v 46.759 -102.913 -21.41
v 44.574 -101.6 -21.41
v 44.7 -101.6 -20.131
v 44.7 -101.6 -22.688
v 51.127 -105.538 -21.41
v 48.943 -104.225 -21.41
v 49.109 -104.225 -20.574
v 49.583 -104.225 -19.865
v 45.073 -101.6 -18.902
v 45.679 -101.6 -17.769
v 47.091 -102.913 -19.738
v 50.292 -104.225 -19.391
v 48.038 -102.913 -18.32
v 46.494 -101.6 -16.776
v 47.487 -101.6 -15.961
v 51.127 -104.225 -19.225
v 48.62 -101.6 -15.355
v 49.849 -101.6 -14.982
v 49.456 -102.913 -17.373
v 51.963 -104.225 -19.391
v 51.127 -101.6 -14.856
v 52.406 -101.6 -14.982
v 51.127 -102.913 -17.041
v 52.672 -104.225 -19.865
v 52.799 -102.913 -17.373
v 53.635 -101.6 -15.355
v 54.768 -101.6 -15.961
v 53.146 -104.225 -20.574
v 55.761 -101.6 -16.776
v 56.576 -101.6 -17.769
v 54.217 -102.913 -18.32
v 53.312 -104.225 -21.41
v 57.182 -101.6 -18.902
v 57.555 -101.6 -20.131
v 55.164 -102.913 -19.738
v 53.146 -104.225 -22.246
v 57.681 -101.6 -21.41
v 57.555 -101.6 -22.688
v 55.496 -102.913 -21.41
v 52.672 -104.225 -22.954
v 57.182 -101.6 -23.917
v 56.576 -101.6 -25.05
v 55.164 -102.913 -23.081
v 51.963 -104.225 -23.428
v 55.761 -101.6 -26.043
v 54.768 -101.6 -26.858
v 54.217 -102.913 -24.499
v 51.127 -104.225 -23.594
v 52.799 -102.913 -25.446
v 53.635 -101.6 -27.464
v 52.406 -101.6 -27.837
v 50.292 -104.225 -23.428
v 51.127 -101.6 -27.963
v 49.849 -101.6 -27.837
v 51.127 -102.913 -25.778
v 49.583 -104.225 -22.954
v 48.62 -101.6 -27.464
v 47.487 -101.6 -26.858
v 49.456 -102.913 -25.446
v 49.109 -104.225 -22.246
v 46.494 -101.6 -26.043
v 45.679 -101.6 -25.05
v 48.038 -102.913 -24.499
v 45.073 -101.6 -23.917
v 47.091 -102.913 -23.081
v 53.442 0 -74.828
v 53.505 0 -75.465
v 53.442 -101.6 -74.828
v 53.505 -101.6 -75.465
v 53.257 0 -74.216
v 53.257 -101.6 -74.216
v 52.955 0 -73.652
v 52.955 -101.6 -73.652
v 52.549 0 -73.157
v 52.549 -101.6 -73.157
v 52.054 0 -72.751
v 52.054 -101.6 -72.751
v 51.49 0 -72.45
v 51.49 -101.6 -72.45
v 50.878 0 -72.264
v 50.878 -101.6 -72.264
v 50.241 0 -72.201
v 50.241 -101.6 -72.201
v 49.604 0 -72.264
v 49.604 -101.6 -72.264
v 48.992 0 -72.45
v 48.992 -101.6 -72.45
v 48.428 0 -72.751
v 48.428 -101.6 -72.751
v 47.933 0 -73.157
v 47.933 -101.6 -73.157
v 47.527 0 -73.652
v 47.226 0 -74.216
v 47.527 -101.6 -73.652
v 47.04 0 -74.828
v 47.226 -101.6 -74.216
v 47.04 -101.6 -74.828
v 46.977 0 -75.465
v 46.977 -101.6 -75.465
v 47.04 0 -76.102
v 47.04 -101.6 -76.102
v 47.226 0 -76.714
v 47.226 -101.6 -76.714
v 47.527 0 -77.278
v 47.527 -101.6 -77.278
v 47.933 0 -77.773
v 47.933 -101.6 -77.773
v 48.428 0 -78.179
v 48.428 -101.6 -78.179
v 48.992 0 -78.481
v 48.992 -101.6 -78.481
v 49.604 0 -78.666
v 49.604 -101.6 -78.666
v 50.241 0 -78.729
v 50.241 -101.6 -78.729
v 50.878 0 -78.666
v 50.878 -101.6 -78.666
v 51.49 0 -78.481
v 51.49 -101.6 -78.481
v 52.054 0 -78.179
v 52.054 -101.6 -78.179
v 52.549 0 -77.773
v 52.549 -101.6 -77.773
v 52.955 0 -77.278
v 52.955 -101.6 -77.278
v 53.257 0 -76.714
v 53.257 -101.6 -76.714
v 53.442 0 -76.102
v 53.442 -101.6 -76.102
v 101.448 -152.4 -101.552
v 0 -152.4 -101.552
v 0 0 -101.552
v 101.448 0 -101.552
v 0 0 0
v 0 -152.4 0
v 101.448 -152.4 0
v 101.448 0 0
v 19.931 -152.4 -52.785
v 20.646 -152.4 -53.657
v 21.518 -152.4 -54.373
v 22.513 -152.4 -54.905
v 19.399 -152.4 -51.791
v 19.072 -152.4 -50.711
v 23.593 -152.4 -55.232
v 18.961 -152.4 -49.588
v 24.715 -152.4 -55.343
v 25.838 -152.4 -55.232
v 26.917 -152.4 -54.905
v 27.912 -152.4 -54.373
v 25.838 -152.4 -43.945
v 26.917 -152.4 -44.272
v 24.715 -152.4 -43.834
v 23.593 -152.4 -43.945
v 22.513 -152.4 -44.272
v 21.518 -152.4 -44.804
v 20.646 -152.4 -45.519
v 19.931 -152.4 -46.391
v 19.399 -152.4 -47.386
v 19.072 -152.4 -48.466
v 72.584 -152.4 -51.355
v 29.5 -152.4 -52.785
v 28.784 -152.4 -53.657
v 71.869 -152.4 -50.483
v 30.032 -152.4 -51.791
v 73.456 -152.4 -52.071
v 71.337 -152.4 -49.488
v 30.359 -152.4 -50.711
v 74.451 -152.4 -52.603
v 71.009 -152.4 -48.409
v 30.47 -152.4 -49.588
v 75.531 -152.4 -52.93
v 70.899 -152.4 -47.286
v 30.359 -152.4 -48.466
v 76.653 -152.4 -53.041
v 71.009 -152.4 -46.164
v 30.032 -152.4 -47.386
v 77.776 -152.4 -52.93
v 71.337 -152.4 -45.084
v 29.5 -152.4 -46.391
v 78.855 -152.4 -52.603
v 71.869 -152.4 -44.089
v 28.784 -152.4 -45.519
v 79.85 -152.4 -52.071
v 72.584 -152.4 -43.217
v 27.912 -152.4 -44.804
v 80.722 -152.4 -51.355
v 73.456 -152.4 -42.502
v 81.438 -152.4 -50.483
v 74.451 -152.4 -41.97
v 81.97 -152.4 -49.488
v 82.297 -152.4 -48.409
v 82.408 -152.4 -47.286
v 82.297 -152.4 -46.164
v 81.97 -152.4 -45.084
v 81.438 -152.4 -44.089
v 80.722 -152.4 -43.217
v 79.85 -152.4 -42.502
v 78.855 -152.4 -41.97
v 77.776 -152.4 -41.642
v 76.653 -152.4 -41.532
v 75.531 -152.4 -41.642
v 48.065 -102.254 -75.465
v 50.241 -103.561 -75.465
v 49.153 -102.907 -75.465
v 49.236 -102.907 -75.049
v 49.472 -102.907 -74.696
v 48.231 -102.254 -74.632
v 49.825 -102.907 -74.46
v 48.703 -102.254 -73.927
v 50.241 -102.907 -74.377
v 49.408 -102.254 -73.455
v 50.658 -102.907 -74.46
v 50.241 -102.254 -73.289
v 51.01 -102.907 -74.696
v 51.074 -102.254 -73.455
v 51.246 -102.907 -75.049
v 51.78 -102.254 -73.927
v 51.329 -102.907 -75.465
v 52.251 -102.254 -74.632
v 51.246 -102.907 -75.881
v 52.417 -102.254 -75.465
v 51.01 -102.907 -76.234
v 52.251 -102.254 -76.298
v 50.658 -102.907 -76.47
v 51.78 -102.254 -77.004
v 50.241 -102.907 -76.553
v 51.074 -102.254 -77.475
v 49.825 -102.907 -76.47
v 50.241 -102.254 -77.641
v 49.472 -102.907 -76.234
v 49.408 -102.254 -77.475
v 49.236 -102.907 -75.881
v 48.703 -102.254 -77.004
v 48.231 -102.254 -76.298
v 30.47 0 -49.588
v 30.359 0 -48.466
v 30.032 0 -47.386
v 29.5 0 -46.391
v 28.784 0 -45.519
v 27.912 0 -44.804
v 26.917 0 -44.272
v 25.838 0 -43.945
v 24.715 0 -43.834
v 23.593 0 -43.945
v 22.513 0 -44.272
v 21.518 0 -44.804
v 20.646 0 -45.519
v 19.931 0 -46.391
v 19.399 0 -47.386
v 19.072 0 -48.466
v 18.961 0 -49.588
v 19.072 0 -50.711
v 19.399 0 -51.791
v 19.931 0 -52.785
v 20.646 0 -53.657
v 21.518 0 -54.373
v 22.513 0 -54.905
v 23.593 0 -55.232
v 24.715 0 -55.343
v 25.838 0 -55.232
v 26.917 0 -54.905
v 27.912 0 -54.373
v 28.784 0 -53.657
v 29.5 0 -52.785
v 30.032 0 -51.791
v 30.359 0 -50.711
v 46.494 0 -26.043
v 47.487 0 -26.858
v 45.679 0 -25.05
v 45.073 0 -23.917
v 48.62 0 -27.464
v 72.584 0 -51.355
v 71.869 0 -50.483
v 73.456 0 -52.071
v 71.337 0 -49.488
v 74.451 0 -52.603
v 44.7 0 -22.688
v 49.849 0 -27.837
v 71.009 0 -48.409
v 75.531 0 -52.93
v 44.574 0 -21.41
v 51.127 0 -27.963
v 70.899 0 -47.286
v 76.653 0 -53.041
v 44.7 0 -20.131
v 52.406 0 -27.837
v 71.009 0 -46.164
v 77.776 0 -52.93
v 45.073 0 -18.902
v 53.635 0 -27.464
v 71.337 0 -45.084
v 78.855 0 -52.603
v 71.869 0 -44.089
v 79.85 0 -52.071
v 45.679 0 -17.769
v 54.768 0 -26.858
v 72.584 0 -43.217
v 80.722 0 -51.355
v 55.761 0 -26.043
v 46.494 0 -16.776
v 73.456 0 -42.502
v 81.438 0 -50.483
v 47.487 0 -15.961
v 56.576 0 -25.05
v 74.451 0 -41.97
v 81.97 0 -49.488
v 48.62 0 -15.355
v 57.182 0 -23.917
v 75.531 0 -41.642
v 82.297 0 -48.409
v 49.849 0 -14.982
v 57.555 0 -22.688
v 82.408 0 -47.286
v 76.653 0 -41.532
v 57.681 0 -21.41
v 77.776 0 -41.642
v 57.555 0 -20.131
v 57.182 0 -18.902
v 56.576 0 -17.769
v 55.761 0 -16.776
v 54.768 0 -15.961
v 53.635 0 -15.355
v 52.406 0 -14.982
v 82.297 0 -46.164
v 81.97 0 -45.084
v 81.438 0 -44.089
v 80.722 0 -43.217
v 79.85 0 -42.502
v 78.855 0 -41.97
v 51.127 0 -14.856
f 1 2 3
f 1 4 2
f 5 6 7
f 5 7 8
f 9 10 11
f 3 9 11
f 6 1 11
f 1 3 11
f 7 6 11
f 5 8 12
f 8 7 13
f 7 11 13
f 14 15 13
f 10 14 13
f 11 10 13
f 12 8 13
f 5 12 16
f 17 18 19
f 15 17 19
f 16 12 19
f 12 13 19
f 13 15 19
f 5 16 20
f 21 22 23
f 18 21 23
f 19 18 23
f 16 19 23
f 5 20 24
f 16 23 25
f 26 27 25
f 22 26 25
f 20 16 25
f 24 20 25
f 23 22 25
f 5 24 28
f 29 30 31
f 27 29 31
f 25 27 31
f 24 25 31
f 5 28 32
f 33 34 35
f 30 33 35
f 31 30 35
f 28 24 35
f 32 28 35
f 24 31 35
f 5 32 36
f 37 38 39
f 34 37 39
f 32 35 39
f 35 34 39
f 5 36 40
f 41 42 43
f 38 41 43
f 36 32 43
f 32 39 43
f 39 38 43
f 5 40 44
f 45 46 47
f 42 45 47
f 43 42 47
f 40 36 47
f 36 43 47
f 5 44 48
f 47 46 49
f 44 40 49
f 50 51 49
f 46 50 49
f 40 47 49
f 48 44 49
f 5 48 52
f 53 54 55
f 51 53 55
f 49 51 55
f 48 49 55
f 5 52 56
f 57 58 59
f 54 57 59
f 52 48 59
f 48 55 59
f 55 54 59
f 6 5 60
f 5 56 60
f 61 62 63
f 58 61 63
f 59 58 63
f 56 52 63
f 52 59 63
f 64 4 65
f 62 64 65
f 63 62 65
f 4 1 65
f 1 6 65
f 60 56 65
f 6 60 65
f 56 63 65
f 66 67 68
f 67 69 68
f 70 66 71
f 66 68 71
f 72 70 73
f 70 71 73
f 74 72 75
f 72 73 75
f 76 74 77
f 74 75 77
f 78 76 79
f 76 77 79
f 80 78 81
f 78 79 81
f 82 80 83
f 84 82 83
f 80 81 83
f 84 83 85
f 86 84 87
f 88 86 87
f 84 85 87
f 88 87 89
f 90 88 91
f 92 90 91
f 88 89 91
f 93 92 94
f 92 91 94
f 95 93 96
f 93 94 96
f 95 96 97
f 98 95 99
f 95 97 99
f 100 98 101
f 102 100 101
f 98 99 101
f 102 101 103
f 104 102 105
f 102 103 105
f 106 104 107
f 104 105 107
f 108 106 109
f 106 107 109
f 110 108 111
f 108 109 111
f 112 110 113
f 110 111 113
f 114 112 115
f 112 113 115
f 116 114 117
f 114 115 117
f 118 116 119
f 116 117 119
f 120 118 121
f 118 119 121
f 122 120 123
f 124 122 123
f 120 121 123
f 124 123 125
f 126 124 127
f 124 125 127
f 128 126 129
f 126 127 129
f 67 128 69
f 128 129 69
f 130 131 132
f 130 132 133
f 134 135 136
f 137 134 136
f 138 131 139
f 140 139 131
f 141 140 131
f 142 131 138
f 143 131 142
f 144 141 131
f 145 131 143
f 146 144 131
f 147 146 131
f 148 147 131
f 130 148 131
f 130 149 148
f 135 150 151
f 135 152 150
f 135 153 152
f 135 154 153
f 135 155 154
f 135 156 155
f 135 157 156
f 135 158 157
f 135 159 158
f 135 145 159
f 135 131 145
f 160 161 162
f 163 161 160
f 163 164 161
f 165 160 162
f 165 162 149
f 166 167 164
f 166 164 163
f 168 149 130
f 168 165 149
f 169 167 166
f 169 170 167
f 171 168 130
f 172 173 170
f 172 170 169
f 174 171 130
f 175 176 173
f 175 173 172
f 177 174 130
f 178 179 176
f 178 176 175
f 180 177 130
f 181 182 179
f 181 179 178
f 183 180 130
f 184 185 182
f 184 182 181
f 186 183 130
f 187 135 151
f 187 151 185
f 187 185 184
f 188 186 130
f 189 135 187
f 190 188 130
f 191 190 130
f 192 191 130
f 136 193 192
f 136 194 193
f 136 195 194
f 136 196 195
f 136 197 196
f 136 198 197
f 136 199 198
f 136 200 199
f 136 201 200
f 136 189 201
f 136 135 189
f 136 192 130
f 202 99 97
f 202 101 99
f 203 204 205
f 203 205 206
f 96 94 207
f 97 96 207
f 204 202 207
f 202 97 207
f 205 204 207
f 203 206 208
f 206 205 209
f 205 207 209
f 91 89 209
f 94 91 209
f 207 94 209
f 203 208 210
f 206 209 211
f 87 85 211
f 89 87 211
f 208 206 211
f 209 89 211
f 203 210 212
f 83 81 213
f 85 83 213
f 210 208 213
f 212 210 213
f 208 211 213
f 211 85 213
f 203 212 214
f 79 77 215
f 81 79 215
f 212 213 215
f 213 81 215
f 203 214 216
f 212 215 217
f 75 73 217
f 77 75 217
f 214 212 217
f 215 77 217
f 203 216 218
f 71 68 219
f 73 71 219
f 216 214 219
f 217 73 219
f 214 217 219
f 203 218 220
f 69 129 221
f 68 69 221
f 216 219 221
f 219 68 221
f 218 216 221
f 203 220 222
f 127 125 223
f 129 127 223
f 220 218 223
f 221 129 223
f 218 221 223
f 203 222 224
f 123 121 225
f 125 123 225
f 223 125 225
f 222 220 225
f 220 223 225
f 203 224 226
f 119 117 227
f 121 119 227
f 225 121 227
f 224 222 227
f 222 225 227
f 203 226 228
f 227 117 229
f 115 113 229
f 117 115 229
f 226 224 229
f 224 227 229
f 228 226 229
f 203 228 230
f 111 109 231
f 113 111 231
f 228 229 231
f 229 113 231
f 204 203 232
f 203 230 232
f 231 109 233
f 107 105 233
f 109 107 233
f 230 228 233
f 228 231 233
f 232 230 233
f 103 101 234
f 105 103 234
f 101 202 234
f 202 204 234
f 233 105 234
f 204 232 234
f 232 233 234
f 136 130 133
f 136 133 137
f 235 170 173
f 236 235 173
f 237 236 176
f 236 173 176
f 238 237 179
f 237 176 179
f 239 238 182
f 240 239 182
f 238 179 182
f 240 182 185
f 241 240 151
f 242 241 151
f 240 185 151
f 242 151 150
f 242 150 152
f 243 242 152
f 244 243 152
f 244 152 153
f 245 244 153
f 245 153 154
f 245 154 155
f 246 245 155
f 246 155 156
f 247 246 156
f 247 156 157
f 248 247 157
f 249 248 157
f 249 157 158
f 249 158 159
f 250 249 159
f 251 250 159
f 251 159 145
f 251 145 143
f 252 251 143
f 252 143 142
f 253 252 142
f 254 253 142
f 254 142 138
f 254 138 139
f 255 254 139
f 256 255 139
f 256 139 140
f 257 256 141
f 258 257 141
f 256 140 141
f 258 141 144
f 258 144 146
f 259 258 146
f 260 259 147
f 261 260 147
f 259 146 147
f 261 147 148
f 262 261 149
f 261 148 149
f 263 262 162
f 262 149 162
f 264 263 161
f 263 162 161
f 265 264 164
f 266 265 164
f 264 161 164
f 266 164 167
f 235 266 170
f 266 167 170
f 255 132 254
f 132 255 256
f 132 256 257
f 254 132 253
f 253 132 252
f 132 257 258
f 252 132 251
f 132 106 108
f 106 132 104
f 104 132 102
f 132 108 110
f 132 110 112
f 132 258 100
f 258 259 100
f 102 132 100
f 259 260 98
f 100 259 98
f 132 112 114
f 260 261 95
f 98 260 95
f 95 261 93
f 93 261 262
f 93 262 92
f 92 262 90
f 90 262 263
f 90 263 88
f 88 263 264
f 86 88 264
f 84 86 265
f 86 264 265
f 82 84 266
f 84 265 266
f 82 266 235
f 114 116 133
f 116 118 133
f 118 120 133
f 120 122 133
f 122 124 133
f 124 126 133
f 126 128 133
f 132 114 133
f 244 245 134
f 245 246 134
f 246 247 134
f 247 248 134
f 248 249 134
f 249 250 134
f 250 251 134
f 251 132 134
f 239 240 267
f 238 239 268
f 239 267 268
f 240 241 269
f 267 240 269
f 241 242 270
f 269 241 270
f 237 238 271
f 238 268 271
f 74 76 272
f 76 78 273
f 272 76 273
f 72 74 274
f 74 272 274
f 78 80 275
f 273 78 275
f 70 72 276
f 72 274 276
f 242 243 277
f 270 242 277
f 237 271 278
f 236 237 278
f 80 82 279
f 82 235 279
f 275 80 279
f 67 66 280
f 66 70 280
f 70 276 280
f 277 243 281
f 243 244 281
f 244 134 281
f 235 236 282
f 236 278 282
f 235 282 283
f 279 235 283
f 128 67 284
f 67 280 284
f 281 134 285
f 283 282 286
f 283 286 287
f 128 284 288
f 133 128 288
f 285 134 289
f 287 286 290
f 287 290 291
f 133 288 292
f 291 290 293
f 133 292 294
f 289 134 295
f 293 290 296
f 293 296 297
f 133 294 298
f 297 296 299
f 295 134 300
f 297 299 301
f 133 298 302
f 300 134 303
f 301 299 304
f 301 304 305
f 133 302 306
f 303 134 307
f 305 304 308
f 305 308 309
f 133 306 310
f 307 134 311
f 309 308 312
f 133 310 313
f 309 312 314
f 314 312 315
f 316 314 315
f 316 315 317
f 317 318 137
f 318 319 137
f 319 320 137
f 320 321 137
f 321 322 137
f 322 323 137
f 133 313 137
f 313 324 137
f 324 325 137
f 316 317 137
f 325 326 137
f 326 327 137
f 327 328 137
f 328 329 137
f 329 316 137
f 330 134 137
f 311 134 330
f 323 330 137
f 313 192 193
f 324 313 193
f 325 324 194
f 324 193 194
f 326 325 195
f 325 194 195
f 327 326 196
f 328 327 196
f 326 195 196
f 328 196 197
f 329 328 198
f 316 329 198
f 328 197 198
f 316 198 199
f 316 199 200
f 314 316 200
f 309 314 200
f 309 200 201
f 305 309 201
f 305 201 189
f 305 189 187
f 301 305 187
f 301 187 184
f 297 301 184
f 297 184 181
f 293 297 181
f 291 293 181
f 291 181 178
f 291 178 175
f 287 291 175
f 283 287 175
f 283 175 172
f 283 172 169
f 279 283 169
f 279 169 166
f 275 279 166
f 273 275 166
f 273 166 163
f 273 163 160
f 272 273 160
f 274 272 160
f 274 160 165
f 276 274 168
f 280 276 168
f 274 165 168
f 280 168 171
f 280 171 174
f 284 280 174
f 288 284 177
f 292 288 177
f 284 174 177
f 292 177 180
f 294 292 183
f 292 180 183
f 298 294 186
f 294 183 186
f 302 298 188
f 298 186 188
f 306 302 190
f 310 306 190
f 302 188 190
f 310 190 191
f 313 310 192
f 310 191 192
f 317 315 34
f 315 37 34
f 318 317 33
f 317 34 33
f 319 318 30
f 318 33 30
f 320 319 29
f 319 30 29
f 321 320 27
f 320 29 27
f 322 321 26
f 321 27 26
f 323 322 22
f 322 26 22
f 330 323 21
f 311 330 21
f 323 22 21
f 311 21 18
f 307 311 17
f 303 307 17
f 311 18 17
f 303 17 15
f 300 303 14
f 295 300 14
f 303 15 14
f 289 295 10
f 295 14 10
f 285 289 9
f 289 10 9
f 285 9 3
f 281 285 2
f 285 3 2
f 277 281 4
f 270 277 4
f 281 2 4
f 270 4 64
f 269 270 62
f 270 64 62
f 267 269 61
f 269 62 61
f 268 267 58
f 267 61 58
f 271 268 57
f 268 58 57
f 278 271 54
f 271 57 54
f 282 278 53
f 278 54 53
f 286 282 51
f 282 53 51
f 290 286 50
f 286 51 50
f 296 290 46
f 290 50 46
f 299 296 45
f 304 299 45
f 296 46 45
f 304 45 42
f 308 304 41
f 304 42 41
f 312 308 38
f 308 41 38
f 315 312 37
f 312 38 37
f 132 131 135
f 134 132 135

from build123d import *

# Parameters (mm, degrees)
F0_W     = 101.4476
F0_H     = 101.5520170331
F1_DEPTH = 152.4
F5_D     = 11.50874
F6_D     = 13.1064
F6_DEPTH = 101.6
F6_TIP   = 3.9375598086
F7_D     = 6.5278
F7_DEPTH = 101.6
F7_TIP   = 1.9611489744


with BuildPart() as f1:
    # F0 (on Front) → F1 (new body)
    with BuildSketch(Plane.XZ):
        with Locations((50.7238, -50.7760085166)):
            Rectangle(F0_W, F0_H)
    extrude(amount=F1_DEPTH)

    # F5 (through all)
    with Locations(Plane(origin=(0, 0, 0), x_dir=(-1, 0, 0), z_dir=(0, 1, 0))):
        with Locations((-76.6532495618, -47.2862608731), (-24.7153807431, -49.5884530246)):
            Hole(F5_D / 2)

    # F6
    with Locations(Plane(origin=(0, 0, 0), x_dir=(-1, 0, 0), z_dir=(0, 1, 0))):
        with Locations((-51.1274710298, -21.4095711708)):
            Hole(F6_D / 2, depth=F6_DEPTH)
            with Locations((0, 0, -(F6_DEPTH + F6_TIP / 2))):  # 118° drill point
                Cone(0, F6_D / 2, F6_TIP, mode=Mode.SUBTRACT)

    # F7
    with Locations(Plane(origin=(0, 0, 0), x_dir=(-1, 0, 0), z_dir=(0, 1, 0))):
        with Locations((-50.2411611378, -75.4651352763)):
            Hole(F7_D / 2, depth=F7_DEPTH)
            with Locations((0, 0, -(F7_DEPTH + F7_TIP / 2))):  # 118° drill point
                Cone(0, F7_D / 2, F7_TIP, mode=Mode.SUBTRACT)


solid = f1.part
